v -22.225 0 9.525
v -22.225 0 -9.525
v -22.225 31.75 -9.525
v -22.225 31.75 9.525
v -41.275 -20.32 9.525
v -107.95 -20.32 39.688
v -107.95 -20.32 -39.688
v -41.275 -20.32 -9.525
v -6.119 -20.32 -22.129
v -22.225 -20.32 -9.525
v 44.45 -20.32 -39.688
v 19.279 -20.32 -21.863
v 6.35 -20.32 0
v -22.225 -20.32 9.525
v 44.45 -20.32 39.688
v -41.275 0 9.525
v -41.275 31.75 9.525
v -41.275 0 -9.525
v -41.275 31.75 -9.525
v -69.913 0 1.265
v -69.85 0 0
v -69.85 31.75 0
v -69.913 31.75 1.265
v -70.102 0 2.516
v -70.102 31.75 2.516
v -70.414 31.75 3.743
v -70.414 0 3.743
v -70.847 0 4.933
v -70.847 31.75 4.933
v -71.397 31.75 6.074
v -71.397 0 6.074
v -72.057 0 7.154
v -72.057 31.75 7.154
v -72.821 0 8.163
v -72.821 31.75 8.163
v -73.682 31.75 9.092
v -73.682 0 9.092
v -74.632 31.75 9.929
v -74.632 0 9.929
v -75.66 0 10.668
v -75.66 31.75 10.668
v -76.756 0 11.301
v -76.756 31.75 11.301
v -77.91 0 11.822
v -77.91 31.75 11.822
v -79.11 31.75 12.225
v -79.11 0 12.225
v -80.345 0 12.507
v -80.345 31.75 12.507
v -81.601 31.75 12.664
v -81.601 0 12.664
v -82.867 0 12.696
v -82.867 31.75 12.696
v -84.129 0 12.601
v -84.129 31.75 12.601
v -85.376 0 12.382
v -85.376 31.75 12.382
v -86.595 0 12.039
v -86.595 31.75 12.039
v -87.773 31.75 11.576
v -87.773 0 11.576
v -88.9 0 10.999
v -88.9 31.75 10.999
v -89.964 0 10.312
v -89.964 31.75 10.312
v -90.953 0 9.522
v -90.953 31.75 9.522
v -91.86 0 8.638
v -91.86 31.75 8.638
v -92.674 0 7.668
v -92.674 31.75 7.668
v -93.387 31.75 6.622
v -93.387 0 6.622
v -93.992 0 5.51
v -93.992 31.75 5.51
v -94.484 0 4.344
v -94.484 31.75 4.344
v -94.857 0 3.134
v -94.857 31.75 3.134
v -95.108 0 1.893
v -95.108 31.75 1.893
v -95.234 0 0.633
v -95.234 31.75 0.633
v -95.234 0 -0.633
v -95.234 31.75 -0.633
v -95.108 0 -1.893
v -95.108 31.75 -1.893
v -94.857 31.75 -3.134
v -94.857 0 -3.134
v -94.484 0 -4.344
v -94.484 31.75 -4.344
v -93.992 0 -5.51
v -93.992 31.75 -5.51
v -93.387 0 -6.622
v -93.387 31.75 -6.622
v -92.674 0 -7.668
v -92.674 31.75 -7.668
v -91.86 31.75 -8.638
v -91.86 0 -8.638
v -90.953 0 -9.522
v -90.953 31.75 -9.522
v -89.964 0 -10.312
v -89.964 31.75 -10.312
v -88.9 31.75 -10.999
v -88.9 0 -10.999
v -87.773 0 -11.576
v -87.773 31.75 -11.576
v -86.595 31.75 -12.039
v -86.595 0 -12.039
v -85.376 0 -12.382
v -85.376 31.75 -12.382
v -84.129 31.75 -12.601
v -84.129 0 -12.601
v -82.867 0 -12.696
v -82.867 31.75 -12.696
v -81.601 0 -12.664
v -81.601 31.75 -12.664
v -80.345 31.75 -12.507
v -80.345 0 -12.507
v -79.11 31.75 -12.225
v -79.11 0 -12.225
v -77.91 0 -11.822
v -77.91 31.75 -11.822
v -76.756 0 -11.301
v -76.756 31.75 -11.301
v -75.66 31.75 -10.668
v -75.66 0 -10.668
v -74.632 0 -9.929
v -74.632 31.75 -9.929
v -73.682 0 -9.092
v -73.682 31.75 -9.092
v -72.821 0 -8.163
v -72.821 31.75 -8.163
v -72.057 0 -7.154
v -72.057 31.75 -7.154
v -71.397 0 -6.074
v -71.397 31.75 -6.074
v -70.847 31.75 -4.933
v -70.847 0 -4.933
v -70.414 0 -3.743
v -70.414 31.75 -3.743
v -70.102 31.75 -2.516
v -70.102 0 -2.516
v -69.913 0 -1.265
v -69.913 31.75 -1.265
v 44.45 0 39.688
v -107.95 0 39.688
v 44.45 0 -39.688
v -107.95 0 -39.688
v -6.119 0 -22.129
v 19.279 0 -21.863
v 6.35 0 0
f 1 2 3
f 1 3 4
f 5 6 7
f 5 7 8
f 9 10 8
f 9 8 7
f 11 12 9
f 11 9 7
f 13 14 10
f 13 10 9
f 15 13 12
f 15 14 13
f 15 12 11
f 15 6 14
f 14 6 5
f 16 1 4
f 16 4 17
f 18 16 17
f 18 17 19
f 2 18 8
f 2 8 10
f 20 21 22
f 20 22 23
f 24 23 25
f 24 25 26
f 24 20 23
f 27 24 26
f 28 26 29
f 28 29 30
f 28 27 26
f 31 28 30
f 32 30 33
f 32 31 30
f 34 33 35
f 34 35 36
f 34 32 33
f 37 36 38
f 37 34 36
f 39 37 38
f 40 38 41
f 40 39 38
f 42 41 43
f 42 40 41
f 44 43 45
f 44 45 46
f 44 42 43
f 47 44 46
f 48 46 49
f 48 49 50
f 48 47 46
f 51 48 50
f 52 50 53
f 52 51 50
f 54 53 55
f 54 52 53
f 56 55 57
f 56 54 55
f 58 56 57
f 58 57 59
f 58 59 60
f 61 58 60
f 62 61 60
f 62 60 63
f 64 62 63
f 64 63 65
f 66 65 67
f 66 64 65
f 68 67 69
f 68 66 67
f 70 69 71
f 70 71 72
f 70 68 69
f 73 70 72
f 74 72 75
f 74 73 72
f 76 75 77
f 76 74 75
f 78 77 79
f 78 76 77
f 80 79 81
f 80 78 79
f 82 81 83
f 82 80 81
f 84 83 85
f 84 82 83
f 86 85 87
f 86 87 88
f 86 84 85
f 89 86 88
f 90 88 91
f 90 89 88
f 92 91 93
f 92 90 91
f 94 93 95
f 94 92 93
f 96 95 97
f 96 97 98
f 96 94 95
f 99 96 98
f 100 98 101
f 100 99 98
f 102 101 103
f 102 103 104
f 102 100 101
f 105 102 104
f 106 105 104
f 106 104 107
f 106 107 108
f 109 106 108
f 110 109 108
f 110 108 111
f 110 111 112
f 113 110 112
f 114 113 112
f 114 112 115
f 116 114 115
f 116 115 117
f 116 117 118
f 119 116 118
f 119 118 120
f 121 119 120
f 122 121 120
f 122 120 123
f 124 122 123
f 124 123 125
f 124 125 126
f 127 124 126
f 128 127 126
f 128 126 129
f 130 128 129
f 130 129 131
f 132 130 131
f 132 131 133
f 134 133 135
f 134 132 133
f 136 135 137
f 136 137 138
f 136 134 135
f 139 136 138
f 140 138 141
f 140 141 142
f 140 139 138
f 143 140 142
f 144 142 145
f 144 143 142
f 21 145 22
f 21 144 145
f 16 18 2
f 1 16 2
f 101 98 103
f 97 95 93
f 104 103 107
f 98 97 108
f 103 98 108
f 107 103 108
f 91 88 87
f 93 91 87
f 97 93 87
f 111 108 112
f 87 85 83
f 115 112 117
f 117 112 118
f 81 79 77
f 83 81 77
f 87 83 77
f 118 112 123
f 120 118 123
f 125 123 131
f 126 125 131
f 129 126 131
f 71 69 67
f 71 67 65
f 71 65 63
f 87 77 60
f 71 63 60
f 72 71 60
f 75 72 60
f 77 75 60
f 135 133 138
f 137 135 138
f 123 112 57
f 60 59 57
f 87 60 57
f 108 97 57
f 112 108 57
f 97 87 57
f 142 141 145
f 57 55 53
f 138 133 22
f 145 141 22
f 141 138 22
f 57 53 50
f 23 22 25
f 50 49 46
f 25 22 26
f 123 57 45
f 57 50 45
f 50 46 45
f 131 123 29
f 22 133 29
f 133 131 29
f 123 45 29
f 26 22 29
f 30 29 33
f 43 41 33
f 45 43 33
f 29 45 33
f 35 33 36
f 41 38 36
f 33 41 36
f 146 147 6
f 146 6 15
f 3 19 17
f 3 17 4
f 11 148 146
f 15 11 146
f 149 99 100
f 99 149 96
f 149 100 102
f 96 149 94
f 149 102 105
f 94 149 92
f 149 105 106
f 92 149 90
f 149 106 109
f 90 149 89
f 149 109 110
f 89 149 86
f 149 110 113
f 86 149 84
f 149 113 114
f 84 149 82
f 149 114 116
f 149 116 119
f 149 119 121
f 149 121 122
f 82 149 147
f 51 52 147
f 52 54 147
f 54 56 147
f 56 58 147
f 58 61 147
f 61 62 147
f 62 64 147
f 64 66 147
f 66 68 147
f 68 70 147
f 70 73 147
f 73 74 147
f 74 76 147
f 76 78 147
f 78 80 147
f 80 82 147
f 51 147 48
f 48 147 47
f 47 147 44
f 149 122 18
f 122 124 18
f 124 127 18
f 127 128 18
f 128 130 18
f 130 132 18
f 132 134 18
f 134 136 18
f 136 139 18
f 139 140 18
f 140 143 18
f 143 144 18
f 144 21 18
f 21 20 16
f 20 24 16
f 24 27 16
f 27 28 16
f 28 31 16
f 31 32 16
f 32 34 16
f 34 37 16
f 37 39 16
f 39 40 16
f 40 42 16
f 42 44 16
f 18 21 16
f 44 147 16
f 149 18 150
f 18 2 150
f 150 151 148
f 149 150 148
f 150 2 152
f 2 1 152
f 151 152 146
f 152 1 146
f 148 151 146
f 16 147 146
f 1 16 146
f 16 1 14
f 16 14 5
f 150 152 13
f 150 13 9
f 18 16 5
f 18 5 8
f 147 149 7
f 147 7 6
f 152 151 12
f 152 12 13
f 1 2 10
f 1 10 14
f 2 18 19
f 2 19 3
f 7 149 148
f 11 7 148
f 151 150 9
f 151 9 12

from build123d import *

# Parameters (mm, degrees)
F0_W     = 152.4
F0_H     = 79.375
F0_R     = 12.7
F1_DEPTH = 20.32
F2_DEPTH = 31.75
F3_DEPTH = 45.974
F4_DEPTH = 84.582
F5_DEPTH = 31.75


with BuildPart() as f1:
    # F0 (on Front) → F1 (new body)
    with BuildSketch(Plane.XZ):
        with Locations((-31.75, 0)):
            Rectangle(F0_W, F0_H)
        Polygon((-6.119448, -22.128553), (6.35, 0), (19.279165, -21.863135), align=None, mode=Mode.SUBTRACT)
        with Locations((-82.55, 0)):
            Circle(F0_R, mode=Mode.SUBTRACT)
        Polygon((-22.225, 9.525), (-22.225, 0), (-22.225, -9.525), (-41.275, -9.525), (-41.275, 0), (-41.275, 9.525), align=None, mode=Mode.SUBTRACT)
        with Locations((-82.55, 0)):
            Circle(F0_R)
        Polygon((-22.225, -9.525), (-22.225, 0), (-31.75, 0), (-41.275, 0), (-41.275, -9.525), align=None)
        Polygon((-31.75, 0), (-22.225, 0), (-22.225, 9.525), (-41.275, 9.525), (-41.275, 0), align=None)
        Polygon((19.279165, -21.863135), (6.35, 0), (-6.119448, -22.128553), align=None)
    extrude(amount=F1_DEPTH)

    # F0 (on Front) → F2 (join)
    with BuildSketch(Plane.XZ):
        with Locations((-82.55, 0)):
            Circle(F0_R)
    extrude(amount=-F2_DEPTH)

    # F0 (on Front) → F3 (cut)
    with BuildSketch(Plane.XZ):
        Polygon((19.279165, -21.863135), (6.35, 0), (-6.119448, -22.128553), align=None)
    extrude(amount=F3_DEPTH, mode=Mode.SUBTRACT)

    # F0 (on Front) → F4 (cut)
    with BuildSketch(Plane.XZ):
        Polygon((-22.225, -9.525), (-22.225, 0), (-31.75, 0), (-41.275, 0), (-41.275, -9.525), align=None)
        Polygon((-31.75, 0), (-22.225, 0), (-22.225, 9.525), (-41.275, 9.525), (-41.275, 0), align=None)
    extrude(amount=F4_DEPTH, mode=Mode.SUBTRACT)


with BuildPart() as f5:
    # F0 (on Front) → F5 (new body)
    with BuildSketch(Plane.XZ):
        Polygon((-22.225, -9.525), (-22.225, 0), (-31.75, 0), (-41.275, 0), (-41.275, -9.525), align=None)
        Polygon((-31.75, 0), (-22.225, 0), (-22.225, 9.525), (-41.275, 9.525), (-41.275, 0), align=None)
    extrude(amount=-F5_DEPTH)


solid = Compound([f1.part, f5.part])
